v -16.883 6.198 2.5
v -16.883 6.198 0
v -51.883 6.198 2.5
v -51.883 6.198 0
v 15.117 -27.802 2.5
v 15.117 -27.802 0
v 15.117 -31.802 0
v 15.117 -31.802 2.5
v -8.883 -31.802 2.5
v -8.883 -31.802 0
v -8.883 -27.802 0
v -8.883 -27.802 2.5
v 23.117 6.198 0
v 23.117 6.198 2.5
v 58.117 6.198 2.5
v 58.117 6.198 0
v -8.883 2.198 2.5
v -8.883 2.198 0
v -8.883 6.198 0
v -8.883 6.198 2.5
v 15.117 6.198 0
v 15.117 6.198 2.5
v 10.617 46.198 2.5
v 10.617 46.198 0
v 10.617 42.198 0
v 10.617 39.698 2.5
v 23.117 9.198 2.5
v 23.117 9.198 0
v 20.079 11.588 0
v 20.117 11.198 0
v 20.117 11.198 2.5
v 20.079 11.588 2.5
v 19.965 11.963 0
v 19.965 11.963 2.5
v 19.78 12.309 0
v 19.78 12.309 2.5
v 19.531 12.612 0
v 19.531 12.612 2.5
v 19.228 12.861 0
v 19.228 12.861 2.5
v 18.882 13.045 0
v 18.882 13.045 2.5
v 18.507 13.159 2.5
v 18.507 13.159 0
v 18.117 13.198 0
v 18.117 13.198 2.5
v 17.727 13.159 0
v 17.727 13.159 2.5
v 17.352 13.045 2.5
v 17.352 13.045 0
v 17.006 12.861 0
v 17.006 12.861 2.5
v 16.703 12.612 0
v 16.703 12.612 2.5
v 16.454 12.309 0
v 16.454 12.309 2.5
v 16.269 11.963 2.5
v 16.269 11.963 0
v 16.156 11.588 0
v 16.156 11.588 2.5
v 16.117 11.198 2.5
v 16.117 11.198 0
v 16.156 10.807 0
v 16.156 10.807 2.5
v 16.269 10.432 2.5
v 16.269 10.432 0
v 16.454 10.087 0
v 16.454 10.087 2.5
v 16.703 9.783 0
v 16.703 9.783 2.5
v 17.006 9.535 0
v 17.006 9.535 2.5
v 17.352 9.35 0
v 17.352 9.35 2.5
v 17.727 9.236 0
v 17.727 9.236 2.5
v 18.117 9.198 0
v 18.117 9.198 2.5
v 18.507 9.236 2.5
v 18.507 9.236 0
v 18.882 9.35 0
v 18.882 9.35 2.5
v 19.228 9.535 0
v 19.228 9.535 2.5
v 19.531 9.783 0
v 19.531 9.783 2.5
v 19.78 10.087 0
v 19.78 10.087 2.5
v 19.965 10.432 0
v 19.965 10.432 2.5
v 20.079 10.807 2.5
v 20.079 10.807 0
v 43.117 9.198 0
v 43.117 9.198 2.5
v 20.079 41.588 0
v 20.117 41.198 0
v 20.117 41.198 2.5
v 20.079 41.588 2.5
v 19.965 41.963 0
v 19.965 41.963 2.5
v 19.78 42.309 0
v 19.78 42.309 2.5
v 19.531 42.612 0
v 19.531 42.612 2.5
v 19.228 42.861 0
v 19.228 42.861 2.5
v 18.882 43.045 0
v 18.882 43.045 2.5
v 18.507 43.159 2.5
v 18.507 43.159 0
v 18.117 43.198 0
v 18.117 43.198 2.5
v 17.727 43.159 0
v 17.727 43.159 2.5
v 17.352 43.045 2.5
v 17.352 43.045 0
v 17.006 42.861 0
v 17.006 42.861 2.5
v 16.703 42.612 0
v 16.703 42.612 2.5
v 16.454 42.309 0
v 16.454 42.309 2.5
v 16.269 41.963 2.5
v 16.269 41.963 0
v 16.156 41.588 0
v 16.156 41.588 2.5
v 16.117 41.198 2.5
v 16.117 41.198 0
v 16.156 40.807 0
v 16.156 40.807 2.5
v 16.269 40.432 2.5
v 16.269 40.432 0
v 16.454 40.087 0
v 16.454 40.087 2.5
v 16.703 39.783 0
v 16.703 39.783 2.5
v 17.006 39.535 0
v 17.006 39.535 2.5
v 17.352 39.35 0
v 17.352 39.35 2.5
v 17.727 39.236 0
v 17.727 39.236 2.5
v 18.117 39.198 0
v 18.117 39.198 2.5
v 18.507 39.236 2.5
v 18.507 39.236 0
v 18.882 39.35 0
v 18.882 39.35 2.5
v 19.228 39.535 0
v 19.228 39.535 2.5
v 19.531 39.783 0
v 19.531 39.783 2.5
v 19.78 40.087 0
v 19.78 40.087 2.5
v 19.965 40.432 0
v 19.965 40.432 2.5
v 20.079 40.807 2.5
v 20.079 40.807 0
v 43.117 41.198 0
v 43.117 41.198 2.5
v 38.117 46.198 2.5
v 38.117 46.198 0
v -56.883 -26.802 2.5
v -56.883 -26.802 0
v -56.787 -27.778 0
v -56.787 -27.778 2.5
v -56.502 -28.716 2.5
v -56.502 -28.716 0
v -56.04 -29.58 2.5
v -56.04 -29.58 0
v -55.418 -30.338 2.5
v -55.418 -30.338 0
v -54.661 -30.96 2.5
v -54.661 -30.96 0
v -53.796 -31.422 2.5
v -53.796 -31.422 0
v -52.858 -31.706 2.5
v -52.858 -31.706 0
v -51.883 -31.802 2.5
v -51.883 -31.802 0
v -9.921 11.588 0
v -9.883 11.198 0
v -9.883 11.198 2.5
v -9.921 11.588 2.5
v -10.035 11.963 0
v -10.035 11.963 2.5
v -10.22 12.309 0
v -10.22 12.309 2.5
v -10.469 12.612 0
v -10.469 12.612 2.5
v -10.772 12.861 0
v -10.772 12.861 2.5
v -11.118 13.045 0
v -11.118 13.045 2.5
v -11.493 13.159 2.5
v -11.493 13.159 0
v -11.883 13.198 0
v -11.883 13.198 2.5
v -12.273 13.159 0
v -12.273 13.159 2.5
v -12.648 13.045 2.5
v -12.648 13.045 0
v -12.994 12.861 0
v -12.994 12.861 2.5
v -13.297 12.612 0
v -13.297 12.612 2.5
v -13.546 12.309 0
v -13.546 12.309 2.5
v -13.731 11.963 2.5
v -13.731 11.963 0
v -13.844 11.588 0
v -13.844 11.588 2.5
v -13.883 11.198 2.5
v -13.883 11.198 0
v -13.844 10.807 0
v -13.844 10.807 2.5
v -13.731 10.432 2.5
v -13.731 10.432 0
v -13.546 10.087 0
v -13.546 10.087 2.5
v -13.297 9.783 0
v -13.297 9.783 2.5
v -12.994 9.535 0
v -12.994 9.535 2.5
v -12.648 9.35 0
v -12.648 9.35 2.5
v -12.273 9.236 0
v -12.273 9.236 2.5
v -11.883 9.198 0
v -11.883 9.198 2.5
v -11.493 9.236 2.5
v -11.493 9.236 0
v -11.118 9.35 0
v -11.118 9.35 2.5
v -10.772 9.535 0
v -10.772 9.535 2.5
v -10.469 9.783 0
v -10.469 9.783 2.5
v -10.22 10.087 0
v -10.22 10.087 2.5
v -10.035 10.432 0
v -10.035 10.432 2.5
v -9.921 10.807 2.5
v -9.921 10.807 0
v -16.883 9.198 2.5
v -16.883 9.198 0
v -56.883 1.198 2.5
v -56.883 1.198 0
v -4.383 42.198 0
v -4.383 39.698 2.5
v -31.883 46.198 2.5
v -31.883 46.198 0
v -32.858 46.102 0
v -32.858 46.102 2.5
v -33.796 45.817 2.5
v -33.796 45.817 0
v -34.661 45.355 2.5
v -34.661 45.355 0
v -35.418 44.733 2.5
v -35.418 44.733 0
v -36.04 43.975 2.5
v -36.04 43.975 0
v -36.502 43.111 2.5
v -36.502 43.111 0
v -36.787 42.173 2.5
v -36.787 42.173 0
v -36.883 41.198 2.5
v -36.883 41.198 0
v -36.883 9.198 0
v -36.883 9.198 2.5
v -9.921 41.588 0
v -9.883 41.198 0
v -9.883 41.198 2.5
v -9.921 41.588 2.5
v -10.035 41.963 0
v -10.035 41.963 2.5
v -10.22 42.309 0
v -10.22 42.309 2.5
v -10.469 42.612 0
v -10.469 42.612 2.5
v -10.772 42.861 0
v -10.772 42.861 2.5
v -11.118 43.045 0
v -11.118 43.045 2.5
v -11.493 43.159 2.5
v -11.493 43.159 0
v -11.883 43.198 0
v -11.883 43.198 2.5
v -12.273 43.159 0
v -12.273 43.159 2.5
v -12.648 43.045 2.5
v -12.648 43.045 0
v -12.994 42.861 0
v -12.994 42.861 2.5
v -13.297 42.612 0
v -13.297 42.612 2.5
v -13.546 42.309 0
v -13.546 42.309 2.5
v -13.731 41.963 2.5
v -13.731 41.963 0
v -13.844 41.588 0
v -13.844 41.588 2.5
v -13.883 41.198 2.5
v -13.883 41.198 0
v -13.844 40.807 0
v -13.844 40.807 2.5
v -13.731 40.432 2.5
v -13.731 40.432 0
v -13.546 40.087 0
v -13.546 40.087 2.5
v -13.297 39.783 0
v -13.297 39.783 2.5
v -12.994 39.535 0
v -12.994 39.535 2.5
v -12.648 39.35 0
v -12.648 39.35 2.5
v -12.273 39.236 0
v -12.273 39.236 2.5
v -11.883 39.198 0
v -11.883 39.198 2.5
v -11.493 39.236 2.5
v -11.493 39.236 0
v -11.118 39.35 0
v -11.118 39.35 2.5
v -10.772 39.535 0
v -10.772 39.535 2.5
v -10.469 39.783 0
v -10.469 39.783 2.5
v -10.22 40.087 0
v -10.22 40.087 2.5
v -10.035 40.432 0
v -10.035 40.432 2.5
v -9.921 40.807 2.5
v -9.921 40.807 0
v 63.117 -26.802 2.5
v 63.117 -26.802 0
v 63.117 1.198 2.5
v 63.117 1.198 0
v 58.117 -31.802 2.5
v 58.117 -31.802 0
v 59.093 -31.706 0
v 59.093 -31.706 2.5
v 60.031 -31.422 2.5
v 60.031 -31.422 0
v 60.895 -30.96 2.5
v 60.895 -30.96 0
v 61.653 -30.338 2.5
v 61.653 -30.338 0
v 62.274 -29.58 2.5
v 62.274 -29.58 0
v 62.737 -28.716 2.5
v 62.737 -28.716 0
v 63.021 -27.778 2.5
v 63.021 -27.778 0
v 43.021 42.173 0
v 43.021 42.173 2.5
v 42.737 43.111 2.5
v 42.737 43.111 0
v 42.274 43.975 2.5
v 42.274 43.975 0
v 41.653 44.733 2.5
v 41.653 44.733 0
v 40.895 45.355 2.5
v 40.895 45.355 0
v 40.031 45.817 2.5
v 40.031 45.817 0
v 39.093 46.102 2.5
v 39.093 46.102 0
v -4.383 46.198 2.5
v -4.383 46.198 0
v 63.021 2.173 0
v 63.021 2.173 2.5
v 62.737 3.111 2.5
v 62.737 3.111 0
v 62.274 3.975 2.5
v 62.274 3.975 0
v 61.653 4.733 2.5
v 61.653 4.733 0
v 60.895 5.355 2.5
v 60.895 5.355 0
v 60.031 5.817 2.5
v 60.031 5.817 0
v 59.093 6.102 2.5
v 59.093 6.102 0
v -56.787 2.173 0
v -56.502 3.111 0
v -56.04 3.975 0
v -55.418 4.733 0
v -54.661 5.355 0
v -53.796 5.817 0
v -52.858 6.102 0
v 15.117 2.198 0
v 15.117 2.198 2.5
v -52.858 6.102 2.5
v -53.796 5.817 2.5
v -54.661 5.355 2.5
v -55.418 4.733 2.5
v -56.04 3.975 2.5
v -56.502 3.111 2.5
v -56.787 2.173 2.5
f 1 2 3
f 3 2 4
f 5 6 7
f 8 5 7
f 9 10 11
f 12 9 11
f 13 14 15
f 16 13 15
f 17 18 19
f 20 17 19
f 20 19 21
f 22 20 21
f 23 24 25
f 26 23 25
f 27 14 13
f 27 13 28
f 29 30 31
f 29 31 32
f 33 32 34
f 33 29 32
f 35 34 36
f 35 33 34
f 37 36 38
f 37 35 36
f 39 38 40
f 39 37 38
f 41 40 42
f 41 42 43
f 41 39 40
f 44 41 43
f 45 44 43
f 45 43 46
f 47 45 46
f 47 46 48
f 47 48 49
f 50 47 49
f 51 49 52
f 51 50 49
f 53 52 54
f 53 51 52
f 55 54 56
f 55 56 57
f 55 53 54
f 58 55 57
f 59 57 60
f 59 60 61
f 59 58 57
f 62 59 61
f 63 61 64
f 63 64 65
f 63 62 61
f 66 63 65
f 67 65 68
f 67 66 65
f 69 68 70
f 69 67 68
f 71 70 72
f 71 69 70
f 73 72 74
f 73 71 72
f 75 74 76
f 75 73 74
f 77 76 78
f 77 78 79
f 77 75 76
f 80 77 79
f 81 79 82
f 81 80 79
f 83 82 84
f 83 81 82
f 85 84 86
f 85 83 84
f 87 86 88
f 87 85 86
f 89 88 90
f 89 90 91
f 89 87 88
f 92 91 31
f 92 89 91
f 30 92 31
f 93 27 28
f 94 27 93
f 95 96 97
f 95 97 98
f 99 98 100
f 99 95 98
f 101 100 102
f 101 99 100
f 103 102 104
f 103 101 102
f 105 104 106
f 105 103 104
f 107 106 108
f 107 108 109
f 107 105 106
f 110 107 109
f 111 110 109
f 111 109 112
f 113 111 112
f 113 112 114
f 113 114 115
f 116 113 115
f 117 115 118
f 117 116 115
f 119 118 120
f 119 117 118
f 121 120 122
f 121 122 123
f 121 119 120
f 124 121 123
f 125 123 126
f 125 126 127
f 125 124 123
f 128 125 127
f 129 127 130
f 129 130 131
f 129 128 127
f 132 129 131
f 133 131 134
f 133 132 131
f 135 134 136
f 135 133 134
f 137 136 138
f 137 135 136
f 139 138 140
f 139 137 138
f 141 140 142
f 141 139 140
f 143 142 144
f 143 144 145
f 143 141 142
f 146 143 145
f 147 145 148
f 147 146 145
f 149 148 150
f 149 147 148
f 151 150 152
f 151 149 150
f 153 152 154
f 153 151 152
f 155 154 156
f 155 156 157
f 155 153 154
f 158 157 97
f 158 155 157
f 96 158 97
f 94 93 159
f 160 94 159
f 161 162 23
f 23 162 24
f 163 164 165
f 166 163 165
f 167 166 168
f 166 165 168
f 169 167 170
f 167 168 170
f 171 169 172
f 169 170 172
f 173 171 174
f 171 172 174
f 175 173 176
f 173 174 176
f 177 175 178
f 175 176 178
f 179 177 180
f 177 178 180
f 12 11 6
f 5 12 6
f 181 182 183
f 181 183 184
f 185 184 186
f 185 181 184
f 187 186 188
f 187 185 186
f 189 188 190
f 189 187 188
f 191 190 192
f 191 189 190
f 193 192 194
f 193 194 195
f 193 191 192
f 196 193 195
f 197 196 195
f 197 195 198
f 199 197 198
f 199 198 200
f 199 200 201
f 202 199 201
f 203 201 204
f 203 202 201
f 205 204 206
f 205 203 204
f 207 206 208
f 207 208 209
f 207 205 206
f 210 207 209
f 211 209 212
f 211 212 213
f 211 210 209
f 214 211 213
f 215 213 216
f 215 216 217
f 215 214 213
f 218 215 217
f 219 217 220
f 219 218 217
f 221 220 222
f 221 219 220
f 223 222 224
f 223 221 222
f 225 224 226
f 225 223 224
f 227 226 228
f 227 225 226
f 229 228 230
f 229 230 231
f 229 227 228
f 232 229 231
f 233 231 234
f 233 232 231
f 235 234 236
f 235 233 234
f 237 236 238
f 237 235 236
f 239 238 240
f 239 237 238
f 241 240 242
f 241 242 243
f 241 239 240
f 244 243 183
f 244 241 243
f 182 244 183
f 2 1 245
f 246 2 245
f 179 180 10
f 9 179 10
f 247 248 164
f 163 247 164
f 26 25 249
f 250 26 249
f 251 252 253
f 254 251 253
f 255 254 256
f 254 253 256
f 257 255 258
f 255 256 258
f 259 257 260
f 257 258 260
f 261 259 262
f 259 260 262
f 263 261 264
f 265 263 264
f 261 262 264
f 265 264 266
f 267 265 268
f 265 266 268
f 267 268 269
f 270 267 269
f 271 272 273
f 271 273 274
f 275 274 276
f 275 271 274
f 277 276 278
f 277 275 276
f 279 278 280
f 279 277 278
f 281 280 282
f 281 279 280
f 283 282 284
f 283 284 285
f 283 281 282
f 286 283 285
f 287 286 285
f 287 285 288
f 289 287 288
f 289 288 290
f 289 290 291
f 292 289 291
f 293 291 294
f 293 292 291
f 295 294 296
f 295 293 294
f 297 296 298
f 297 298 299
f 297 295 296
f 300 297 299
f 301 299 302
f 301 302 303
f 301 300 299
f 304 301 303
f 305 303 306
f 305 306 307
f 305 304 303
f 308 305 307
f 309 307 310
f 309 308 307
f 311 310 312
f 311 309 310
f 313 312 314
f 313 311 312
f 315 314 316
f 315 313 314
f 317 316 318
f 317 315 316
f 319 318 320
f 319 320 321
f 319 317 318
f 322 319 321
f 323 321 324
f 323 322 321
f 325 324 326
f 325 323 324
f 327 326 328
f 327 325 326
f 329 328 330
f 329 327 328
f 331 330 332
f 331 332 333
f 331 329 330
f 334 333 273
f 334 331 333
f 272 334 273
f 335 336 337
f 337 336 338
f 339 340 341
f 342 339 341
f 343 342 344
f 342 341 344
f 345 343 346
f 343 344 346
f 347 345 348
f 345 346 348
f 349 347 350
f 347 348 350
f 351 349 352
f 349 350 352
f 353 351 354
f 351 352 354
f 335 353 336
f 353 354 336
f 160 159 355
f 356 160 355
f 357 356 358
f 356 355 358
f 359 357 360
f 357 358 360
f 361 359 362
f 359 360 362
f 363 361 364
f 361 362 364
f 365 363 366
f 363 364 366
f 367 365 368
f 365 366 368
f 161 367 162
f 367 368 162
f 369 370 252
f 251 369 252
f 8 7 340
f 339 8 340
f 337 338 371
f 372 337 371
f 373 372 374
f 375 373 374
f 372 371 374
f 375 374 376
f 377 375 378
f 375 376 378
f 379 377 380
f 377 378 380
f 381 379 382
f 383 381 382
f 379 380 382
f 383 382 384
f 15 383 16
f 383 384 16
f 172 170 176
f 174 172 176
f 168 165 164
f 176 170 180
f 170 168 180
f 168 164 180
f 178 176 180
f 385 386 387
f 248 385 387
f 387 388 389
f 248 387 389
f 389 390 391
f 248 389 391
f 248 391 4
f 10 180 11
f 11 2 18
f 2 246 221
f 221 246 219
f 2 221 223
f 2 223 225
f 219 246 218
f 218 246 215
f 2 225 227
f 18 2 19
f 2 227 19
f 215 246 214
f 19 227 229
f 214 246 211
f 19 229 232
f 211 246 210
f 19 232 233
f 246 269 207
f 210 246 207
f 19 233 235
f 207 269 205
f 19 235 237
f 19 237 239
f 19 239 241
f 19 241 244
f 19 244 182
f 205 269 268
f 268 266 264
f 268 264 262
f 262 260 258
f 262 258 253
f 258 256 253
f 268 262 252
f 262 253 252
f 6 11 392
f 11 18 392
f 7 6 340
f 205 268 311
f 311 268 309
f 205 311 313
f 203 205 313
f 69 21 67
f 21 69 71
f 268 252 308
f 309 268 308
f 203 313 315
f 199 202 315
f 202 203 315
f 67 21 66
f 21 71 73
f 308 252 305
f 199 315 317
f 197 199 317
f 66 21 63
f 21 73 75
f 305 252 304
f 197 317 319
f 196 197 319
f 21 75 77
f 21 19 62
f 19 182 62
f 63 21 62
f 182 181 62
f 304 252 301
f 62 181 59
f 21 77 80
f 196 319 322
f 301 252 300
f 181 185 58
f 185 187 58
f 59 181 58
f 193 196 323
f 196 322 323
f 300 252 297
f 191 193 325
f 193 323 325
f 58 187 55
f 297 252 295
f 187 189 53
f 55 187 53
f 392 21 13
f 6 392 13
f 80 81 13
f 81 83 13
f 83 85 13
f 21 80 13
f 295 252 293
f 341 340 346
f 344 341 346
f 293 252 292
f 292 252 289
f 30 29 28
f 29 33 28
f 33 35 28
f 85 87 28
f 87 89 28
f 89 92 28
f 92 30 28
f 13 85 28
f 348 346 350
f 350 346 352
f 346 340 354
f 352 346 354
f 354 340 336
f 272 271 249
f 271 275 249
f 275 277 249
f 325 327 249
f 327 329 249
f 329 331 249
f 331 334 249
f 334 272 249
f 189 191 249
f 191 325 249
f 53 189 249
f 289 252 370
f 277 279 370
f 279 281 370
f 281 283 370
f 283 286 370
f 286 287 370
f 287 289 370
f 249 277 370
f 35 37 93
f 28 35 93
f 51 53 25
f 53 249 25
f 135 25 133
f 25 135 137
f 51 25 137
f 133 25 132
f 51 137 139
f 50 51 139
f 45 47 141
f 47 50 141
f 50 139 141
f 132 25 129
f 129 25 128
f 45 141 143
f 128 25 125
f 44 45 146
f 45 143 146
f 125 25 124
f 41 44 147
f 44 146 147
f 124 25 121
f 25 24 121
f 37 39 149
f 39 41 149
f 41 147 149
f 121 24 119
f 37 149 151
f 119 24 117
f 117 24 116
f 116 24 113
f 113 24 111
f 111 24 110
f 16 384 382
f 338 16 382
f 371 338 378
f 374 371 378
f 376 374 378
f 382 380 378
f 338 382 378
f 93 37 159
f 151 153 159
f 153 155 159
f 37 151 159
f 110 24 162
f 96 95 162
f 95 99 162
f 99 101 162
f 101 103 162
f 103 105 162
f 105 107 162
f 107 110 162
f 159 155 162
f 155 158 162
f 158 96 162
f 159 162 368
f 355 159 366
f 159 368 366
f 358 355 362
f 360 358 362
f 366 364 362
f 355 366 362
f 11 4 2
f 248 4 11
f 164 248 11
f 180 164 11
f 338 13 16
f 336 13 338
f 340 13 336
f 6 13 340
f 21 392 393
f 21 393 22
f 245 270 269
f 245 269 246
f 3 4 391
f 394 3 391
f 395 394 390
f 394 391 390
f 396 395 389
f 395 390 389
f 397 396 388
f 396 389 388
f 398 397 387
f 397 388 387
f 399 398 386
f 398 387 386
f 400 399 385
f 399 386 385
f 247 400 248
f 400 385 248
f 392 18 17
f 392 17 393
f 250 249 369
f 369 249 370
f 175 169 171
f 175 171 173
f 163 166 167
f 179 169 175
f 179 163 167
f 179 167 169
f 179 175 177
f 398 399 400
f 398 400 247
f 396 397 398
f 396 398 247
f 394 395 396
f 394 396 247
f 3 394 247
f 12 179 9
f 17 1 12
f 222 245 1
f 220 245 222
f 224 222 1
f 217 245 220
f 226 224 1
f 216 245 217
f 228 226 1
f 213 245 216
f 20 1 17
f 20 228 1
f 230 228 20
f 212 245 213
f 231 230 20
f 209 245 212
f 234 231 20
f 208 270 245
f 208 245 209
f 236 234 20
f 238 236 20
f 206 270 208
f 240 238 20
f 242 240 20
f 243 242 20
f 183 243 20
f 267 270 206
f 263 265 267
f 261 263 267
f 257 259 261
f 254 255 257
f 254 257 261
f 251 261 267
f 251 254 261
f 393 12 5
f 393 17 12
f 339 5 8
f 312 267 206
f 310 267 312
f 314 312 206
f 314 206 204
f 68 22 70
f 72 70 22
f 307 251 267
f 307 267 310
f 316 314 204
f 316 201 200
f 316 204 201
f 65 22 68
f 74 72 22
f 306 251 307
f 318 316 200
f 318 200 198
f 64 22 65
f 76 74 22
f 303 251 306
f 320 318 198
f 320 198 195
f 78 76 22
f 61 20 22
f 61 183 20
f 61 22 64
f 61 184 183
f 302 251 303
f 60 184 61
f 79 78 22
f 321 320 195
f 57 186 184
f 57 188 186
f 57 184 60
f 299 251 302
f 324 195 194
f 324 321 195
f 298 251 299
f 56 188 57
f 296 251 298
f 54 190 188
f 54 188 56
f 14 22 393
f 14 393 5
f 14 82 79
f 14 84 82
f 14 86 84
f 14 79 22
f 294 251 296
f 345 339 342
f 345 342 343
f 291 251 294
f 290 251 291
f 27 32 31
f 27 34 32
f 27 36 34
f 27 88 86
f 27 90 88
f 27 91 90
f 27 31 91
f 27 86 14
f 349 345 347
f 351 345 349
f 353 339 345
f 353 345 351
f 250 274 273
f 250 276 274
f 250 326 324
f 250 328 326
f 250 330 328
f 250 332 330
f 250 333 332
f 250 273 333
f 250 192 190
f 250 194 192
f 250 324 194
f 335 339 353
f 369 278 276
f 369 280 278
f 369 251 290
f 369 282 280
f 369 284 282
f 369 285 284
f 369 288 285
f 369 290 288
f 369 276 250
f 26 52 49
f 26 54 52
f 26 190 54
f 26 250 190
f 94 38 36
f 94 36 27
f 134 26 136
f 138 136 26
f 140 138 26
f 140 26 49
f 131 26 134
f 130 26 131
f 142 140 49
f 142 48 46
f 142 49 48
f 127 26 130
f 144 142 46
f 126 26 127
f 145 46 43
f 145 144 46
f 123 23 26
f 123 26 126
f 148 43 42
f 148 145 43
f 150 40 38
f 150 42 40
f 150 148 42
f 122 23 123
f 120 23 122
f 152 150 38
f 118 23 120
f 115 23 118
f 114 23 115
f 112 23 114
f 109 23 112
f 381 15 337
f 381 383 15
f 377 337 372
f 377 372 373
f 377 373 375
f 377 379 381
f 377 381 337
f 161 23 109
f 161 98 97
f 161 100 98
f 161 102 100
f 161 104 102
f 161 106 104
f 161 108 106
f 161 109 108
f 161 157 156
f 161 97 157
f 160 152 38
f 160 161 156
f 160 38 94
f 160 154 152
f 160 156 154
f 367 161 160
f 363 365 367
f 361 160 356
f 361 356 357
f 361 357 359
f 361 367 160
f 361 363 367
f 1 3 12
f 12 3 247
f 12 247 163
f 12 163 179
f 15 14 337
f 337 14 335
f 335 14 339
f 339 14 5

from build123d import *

# Parameters (mm, degrees)
F0_W     = 24
F0_H     = 4
F0_R     = 2
F1_DEPTH = 2.5
F2_W     = 20
F2_H     = 3
F3_DEPTH = 25
F4_SIZE  = 2.49999


# Not quite as in the source:
# - a fillet or chamfer is up to 0.001 mm smaller than in the source, because OpenCascade refuses the exact size


with BuildPart() as f1:
    # F0 (on Top) → F1 (new body)
    with BuildSketch(Plane.XY):
        with BuildLine():
            Line((-36.8828806926, 6.1976464093), (-51.8828806926, 6.1976464093))
            ThreePointArc((-51.8828806926, 6.1976464093), (-55.4184145986, 4.7331803152), (-56.8828806926, 1.1976464093))
            Line((-56.8828806926, 1.1976464093), (-56.8828806926, -26.8023535907))
            ThreePointArc((-56.8828806926, -26.8023535907), (-55.4184145986, -30.3378874967), (-51.8828806926, -31.8023535907))
            Line((-51.8828806926, -31.8023535907), (-8.8828806926, -31.8023535907))
            Line((-8.8828806926, -31.8023535907), (-8.8828806926, -27.8023535907))
            Line((-8.8828806926, -27.8023535907), (15.1171193074, -27.8023535907))
            Line((15.1171193074, -27.8023535907), (15.1171193074, -31.8023535907))
            Line((15.1171193074, -31.8023535907), (58.1171193074, -31.8023535907))
            ThreePointArc((58.1171193074, -31.8023535907), (61.6526532133, -30.3378874967), (63.1171193074, -26.8023535907))
            Line((63.1171193074, -26.8023535907), (63.1171193074, 1.1976464093))
            ThreePointArc((63.1171193074, 1.1976464093), (61.6526532133, 4.7331803152), (58.1171193074, 6.1976464093))
            Line((58.1171193074, 6.1976464093), (43.1171193074, 6.1976464093))
            Line((43.1171193074, 6.1976464093), (23.1171193074, 6.1976464093))
            Line((23.1171193074, 6.1976464093), (23.1171193074, 41.1976464093))
            ThreePointArc((23.1171193074, 41.1976464093), (21.6526532133, 44.7331803152), (18.1171193074, 46.1976464093))
            Line((18.1171193074, 46.1976464093), (10.6171193074, 46.1976464093))
            Line((10.6171193074, 46.1976464093), (10.6171193074, 42.1976464093))
            Line((10.6171193074, 42.1976464093), (-4.3828806926, 42.1976464093))
            Line((-4.3828806926, 42.1976464093), (-4.3828806926, 46.1976464093))
            Line((-4.3828806926, 46.1976464093), (-11.8828806926, 46.1976464093))
            ThreePointArc((-11.8828806926, 46.1976464093), (-15.4184145986, 44.7331803152), (-16.8828806926, 41.1976464093))
            Line((-16.8828806926, 41.1976464093), (-16.8828806926, 6.1976464093))
            Line((-16.8828806926, 6.1976464093), (-36.8828806926, 6.1976464093))
        make_face()
        with Locations((3.1171193074, 4.1976464093)):
            Rectangle(F0_W, F0_H, mode=Mode.SUBTRACT)
        with Locations((-11.8828806926, 11.1976464093)):
            Circle(F0_R, mode=Mode.SUBTRACT)
        with Locations((-11.8828806926, 41.1976464093)):
            Circle(F0_R, mode=Mode.SUBTRACT)
        with Locations((18.1171193074, 11.1976464093)):
            Circle(F0_R, mode=Mode.SUBTRACT)
        with Locations((18.1171193074, 41.1976464093)):
            Circle(F0_R, mode=Mode.SUBTRACT)
        with BuildLine():
            Line((-36.8828806926, 41.1976464093), (-36.8828806926, 6.1976464093))
            Line((-36.8828806926, 6.1976464093), (-16.8828806926, 6.1976464093))
            Line((-16.8828806926, 6.1976464093), (-16.8828806926, 41.1976464093))
            ThreePointArc((-16.8828806926, 41.1976464093), (-15.4184145986, 44.7331803152), (-11.8828806926, 46.1976464093))
            Line((-11.8828806926, 46.1976464093), (-16.8828806926, 46.1976464093))
            Line((-16.8828806926, 46.1976464093), (-31.8828806926, 46.1976464093))
            ThreePointArc((-31.8828806926, 46.1976464093), (-35.4184145986, 44.7331803152), (-36.8828806926, 41.1976464093))
        make_face()
        with BuildLine():
            Line((23.1171193074, 46.1976464093), (18.1171193074, 46.1976464093))
            ThreePointArc((18.1171193074, 46.1976464093), (21.6526532133, 44.7331803152), (23.1171193074, 41.1976464093))
            Line((23.1171193074, 41.1976464093), (23.1171193074, 6.1976464093))
            Line((23.1171193074, 6.1976464093), (43.1171193074, 6.1976464093))
            Line((43.1171193074, 6.1976464093), (43.1171193074, 41.1976464093))
            ThreePointArc((43.1171193074, 41.1976464093), (41.6526532133, 44.7331803152), (38.1171193074, 46.1976464093))
            Line((38.1171193074, 46.1976464093), (23.1171193074, 46.1976464093))
        make_face()
    extrude(amount=F1_DEPTH)

    # F2 (on face) → F3 (cut)
    with BuildSketch(Plane.XY.offset(2.5)):
        with Locations((-26.8828806926, 7.6976464093)):
            Rectangle(F2_W, F2_H)
        with Locations((33.1171193074, 7.6976464093)):
            Rectangle(F2_W, F2_H)
    extrude(amount=-F3_DEPTH, mode=Mode.SUBTRACT)

    # F4 (size 2.5 in the source; OpenCascade refuses exactly that, so slightly less here)
    f4_edges = [f1.edges().sort_by_distance(p)[0] for p in [
        (3.117119, 42.197646, 2.5),
    ]]
    chamfer(f4_edges, length=F4_SIZE)


solid = f1.part
